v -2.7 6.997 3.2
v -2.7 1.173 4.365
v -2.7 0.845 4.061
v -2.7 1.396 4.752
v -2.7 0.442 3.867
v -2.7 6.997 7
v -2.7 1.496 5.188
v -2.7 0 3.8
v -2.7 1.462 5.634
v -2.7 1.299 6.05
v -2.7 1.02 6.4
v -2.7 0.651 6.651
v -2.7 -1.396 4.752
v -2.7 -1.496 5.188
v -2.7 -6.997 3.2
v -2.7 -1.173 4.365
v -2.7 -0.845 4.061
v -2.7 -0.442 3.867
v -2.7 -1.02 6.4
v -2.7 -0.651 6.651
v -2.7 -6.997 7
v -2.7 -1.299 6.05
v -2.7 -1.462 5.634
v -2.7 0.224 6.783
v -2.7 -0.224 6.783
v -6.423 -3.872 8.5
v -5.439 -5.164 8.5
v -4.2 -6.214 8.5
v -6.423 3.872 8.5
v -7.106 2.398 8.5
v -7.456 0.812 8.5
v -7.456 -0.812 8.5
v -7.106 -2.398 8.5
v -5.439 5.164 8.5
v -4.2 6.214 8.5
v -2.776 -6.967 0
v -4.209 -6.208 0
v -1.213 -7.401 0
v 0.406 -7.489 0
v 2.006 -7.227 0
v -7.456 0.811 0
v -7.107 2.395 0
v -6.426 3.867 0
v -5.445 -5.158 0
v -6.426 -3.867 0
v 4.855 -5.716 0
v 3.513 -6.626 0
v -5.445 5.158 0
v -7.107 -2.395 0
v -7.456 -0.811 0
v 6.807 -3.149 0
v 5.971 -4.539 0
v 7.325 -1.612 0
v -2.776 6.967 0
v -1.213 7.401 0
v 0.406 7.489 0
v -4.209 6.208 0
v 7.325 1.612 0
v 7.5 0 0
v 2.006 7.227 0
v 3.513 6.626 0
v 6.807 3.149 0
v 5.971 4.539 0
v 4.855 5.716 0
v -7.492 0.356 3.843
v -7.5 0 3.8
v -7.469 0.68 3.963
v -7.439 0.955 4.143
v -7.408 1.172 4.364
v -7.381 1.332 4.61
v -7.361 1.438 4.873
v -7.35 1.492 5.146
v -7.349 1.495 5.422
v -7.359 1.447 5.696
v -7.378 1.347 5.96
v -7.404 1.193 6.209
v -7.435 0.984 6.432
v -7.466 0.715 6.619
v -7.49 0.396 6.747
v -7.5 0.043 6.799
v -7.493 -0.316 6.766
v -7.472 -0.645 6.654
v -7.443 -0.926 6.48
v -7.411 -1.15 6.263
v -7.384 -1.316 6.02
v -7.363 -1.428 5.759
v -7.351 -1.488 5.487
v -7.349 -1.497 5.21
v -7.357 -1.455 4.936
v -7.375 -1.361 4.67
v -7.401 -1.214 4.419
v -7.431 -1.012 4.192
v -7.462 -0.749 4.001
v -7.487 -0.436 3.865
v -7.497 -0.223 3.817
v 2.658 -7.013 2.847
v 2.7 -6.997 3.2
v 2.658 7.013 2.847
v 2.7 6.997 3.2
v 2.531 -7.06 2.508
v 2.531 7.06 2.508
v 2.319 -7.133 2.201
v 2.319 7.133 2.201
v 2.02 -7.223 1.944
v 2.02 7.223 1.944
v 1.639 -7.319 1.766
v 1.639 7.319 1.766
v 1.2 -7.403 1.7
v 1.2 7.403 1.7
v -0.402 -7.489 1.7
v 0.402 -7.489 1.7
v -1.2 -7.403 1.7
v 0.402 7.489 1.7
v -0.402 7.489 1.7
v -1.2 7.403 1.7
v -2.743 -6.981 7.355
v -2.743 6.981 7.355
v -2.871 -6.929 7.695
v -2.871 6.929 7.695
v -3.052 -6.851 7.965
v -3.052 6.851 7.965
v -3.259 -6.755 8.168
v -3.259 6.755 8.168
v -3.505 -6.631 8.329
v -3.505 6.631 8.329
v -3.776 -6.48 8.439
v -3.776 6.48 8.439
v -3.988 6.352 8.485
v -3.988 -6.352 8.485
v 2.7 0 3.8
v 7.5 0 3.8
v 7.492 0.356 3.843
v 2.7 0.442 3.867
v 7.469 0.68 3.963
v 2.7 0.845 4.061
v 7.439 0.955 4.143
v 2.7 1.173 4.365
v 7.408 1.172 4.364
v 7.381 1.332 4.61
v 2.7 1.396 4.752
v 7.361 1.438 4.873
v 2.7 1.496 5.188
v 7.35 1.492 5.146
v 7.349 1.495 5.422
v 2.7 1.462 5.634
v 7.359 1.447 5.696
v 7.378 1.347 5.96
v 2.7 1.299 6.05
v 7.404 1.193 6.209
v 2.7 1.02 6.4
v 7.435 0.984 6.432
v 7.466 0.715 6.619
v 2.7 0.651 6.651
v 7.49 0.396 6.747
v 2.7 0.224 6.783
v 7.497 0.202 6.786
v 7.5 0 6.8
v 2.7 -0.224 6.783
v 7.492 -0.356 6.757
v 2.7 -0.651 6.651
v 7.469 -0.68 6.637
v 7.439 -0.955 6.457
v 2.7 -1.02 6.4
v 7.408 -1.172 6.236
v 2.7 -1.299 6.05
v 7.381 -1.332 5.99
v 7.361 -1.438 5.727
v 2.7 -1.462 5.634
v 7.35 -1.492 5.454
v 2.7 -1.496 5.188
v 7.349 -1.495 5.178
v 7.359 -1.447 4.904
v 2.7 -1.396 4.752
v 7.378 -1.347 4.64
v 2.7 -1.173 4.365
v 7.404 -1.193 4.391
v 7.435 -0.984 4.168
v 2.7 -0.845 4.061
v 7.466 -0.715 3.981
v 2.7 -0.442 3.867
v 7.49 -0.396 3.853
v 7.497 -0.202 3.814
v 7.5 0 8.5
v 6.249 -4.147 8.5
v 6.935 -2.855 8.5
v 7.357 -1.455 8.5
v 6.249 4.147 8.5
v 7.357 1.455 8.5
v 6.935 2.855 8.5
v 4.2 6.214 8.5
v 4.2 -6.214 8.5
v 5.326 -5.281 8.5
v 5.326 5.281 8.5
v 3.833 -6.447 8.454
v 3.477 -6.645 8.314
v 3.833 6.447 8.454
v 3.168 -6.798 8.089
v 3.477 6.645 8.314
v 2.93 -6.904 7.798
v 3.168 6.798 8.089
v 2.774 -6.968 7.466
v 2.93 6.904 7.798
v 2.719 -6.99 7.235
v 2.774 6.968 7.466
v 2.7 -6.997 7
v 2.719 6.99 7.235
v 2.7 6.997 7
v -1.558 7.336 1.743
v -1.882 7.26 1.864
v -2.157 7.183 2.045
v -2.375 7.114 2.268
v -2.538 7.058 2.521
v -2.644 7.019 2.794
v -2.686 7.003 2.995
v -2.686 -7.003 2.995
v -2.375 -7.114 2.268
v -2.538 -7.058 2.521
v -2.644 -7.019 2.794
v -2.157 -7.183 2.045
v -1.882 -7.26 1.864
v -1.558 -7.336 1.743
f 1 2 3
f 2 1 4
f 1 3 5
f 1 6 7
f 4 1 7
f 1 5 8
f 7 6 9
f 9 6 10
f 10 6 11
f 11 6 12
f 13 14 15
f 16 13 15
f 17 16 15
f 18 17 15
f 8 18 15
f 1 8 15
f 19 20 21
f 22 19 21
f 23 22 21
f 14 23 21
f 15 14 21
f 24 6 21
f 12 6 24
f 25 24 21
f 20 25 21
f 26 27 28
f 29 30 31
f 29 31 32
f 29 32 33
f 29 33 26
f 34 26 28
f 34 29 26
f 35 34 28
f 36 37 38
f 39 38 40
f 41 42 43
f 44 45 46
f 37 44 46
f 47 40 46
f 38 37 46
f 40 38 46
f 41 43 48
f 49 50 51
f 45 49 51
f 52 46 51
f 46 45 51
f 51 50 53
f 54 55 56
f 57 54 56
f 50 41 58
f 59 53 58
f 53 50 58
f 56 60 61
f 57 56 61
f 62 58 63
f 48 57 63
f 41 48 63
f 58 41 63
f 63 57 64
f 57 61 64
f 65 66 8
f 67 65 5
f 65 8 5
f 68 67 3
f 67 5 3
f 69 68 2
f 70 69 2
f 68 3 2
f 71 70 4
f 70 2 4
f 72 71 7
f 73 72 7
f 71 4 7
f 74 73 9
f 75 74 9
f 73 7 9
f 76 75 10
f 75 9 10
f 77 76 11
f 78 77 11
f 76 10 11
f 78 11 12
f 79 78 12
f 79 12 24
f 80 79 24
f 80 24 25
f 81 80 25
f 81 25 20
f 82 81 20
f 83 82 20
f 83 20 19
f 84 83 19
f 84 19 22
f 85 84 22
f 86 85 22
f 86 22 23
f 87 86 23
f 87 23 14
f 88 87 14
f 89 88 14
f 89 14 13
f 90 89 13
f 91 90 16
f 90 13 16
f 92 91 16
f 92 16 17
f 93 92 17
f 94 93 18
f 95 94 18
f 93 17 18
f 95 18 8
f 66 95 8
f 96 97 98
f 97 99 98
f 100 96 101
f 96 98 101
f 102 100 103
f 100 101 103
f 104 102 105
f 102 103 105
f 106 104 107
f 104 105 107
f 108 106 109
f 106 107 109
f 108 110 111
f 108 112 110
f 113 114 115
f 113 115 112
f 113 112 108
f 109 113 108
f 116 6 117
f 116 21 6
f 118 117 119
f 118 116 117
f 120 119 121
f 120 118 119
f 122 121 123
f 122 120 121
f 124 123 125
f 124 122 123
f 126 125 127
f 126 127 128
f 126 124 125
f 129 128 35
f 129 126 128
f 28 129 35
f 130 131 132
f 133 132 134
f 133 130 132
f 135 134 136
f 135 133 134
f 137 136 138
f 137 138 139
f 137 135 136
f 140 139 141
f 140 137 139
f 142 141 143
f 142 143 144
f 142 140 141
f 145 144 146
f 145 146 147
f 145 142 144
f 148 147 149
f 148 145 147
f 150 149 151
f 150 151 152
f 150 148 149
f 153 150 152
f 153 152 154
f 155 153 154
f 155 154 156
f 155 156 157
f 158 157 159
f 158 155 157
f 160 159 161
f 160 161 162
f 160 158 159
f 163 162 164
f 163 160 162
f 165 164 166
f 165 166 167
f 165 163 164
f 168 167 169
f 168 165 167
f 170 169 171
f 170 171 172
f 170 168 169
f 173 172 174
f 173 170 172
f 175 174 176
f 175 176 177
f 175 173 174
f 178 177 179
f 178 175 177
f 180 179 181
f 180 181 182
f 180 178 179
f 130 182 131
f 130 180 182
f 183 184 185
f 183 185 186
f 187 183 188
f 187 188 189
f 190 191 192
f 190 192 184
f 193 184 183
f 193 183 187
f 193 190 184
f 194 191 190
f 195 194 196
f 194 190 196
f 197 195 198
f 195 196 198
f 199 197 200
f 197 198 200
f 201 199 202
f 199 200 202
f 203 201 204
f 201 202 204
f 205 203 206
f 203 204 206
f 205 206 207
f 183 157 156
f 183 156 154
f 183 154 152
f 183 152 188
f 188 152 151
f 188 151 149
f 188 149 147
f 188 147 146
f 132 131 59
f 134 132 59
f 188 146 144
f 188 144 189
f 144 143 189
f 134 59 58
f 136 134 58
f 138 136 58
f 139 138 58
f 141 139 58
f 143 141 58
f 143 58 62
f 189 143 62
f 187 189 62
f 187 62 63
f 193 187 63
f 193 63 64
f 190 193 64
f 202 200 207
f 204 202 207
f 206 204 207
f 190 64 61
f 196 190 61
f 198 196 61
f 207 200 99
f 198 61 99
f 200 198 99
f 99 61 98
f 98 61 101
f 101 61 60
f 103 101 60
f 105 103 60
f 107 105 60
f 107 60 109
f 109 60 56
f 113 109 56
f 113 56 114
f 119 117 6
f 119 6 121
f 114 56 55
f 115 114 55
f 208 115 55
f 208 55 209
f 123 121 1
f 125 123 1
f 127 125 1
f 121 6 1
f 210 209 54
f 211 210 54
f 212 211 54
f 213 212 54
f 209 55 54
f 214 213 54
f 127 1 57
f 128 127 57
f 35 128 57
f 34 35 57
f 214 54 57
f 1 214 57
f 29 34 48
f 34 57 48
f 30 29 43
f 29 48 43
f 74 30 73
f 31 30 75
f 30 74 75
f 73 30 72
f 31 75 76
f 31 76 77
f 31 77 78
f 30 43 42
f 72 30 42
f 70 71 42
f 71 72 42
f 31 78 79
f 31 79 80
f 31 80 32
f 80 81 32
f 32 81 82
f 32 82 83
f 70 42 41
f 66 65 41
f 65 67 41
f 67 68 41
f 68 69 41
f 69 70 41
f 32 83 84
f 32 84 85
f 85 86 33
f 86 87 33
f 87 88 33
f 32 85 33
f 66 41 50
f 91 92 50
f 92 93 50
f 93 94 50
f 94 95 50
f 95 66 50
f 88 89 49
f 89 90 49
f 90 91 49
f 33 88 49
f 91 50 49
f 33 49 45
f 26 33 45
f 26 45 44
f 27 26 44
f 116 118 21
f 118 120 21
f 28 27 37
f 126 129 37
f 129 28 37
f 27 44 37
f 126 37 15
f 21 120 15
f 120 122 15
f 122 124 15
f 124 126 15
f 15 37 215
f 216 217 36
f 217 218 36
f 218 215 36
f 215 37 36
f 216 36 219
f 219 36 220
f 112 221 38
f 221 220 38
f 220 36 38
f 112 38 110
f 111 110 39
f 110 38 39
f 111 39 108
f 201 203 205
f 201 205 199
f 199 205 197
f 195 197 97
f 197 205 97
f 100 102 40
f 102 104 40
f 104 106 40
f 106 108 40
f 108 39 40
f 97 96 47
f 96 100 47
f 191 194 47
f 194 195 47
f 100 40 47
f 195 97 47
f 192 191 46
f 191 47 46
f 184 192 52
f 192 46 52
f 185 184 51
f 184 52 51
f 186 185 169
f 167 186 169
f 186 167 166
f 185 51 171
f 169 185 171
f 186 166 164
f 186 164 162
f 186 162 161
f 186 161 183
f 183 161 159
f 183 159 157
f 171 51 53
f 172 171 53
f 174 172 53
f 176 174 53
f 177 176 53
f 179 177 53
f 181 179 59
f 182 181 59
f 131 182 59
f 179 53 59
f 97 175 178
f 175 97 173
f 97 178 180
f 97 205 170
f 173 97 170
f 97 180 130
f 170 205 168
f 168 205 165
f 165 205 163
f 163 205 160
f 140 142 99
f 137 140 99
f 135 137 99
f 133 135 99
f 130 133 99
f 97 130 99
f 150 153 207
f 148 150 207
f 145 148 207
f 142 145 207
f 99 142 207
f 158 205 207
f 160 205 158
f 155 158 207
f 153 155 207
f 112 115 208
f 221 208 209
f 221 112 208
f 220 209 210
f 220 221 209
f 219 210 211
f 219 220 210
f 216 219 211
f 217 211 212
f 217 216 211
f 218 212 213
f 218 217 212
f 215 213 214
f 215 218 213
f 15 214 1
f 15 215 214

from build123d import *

# Parameters (mm, degrees)
SKETCH1_R               = 7.5
BOSS_EXTRUDE1_DEPTH     = 8.5
CUT_EXTRUDE1_DEPTH      = 6.8
SKETCH3_R               = 1.5
CUT_EXTRUDE2_DEPTH      = 11.2
CUT_EXTRUDE2_DEPTH_BACK = 5.8
FILLET1_R               = 1.5


with BuildPart() as part:
    # Sketch1 → Boss-Extrude1 (new body)
    with BuildSketch(Plane.XY):
        Circle(SKETCH1_R)
    extrude(amount=BOSS_EXTRUDE1_DEPTH)

    # Sketch2 → Cut-Extrude1 (cut)
    with BuildSketch(Plane.XY.offset(8.5)):
        Polygon((2.7, 0), (2.7, 13.78279584), (-2.7, 13.78279584), (-2.7, 0), (-2.7, -14.12853377), (2.7, -14.12853377), align=None)
    extrude(amount=-CUT_EXTRUDE1_DEPTH, mode=Mode.SUBTRACT)

    # Sketch3 → Cut-Extrude2 (cut, two sides)
    with BuildSketch(Plane(origin=(-2.7, 0, 0), x_dir=(0, 0, -1), z_dir=(1, 0, 0))) as cut_extrude2_sk:
        with Locations((-5.3, 0)):
            Circle(SKETCH3_R)
    extrude(amount=CUT_EXTRUDE2_DEPTH, mode=Mode.SUBTRACT)
    extrude(cut_extrude2_sk.sketch, amount=-CUT_EXTRUDE2_DEPTH_BACK, mode=Mode.SUBTRACT)

    # Fillet1
    fillet1_edges = [part.edges().sort_by_distance(p)[0] for p in [
        (-2.7, 0, 1.7),
        (2.7, 0, 1.7),
        (2.7, 0, 8.5),
        (-2.7, 0, 8.5),
    ]]
    fillet(fillet1_edges, radius=FILLET1_R)


solid = part.part
